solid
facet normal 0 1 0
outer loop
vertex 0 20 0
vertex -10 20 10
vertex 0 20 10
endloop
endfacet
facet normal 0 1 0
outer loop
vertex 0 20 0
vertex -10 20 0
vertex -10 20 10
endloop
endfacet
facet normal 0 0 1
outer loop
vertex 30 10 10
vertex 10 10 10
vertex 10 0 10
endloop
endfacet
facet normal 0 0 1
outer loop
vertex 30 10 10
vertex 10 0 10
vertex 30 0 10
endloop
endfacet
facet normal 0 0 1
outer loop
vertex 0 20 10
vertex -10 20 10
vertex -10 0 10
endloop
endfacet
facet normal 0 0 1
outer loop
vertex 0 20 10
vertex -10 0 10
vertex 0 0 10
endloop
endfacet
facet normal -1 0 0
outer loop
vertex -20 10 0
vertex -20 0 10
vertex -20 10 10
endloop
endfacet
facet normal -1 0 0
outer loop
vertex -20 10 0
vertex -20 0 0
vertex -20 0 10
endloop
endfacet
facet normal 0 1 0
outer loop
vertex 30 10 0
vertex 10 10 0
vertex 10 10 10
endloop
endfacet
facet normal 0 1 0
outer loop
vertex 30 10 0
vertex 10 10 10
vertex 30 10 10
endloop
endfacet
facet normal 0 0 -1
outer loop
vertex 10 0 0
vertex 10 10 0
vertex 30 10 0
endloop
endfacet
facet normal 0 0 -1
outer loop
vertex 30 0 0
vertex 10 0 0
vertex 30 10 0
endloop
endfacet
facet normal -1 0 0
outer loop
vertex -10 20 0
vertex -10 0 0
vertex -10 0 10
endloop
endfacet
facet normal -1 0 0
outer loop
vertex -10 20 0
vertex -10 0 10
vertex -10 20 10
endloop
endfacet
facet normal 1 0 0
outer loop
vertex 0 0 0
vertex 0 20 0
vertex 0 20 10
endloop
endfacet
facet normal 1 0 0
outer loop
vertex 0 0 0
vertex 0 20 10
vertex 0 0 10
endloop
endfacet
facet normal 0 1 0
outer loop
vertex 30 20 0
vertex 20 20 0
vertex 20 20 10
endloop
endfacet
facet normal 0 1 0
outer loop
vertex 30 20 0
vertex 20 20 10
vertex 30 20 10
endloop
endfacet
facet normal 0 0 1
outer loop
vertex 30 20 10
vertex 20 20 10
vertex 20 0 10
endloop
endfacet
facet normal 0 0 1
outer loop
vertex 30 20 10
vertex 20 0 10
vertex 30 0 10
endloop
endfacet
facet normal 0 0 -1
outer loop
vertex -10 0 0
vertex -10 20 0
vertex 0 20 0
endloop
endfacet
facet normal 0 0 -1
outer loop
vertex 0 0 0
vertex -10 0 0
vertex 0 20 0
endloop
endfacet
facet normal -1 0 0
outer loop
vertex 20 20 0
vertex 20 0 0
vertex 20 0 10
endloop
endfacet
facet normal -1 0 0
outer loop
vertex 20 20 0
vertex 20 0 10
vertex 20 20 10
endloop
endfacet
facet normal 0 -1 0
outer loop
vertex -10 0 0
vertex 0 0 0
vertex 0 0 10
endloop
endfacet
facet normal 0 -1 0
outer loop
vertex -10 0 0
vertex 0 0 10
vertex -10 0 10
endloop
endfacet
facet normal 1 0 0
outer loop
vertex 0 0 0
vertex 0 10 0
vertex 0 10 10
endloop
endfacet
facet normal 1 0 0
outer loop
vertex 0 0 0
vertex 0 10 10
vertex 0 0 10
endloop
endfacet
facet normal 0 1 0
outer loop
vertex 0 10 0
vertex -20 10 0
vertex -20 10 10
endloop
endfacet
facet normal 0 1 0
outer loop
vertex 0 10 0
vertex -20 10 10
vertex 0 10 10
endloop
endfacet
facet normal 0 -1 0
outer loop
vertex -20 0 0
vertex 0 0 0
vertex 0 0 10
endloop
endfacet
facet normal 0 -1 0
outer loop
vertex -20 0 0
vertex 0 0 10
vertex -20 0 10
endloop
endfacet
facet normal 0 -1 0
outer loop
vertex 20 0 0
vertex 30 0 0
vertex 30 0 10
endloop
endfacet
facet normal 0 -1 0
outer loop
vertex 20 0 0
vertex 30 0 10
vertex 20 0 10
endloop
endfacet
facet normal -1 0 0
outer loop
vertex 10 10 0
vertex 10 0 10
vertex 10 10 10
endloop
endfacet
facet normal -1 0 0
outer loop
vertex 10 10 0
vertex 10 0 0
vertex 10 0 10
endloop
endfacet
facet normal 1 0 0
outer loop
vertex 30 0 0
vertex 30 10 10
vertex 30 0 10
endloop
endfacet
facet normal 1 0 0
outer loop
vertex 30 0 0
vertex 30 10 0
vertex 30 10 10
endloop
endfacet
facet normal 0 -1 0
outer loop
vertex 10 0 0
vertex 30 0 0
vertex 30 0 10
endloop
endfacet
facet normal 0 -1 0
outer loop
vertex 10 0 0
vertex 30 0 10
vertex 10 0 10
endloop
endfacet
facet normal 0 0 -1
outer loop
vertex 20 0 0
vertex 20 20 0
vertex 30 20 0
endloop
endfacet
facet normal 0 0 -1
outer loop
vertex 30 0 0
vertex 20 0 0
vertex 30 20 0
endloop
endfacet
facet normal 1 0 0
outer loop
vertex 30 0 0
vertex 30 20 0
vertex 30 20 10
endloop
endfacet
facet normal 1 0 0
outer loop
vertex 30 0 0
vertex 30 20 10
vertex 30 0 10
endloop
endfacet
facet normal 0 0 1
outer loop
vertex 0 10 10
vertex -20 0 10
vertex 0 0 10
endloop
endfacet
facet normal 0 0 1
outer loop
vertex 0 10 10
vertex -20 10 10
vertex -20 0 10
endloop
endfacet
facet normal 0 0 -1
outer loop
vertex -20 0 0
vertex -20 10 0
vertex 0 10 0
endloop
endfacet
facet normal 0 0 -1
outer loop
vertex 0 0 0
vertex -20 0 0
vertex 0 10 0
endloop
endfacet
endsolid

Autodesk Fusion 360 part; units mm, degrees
sketch "Sketch1" plane through (0, 0, 0) normal (0, 0, 1) x (1, 0, 0)
  line L0 (0, 0) -> (-20, 0)
  line L1 (-20, 0) -> (-20, 10)
  line L2 (-20, 10) -> (0, 10)
  line L3 (0, 10) -> (0, 0)
  line L4 (0, 0) -> (-10, 0)
  line L5 (-10, 0) -> (-10, 20)
  line L6 (-10, 20) -> (0, 20)
  line L7 (0, 20) -> (0, 0)
  line L8 (10, 10) -> (30, 10)
  line L9 (30, 10) -> (30, 0)
  line L10 (30, 0) -> (10, 0)
  line L11 (10, 0) -> (10, 10)
  line L12 (30, 0) -> (20, 0)
  line L13 (20, 0) -> (20, 20)
  line L14 (20, 20) -> (30, 20)
  line L15 (30, 20) -> (30, 0)
extrude "Extrude1" add sketch "Sketch1" along normal blind 10 contours L0 L2 L3 L4 L5 L7 | L0 L1 L2 L5 | L8 L10 L11 L13 | L8 L9 L10 L12 L13 L15 makes body 1 at (-13.3333, 3.3333, 0) makes body 2 at (16.6667, 3.3333, 0)
extrude "Extrude2" add sketch "Sketch1" along normal blind 10 separate body contours L0 L2 L3 L4 L5 L7 | L2 L5 L6 L7 | L8 L13 L14 L15 | L8 L9 L10 L12 L13 L15 makes body 3 at (-6.6667, 6.6667, 0) makes body 4 at (23.3333, 6.6667, 0)
